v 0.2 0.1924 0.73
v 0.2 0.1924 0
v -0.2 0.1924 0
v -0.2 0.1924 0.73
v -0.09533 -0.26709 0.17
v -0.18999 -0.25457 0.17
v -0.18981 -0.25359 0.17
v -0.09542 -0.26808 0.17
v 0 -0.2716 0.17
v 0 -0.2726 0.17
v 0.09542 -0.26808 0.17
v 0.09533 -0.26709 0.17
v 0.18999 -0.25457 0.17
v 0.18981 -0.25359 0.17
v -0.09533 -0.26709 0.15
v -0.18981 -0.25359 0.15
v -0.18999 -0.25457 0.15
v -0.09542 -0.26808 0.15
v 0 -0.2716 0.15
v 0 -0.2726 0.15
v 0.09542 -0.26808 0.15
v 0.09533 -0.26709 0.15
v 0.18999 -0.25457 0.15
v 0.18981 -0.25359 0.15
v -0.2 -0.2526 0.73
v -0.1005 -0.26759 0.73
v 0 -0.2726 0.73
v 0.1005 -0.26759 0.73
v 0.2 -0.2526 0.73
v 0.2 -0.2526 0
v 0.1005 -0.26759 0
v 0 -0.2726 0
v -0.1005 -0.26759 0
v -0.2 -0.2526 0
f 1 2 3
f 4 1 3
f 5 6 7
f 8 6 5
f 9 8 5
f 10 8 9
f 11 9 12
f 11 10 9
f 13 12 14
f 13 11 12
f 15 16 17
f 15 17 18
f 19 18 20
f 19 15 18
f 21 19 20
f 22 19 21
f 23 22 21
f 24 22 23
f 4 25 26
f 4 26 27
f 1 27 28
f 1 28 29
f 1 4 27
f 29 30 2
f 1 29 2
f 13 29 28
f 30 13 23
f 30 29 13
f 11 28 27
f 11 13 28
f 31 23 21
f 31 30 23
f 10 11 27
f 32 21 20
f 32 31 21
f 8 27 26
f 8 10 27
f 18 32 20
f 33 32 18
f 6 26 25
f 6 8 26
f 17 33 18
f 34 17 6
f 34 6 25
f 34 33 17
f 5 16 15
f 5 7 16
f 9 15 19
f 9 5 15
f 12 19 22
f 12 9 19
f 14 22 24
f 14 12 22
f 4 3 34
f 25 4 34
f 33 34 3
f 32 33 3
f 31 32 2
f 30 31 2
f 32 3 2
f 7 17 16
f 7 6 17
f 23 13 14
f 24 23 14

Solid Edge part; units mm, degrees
sketch "Sketch1" plane through (0, 0, 0) normal (0, 0, 1) x (1, 0, 0)
  line L0 (0.2, -0.2526) -> (0.2, 0.1924)
  line L1 (0.2, 0.1924) -> (-0.2, 0.1924)
  line L2 (-0.2, 0.1924) -> (-0.2, -0.2526)
  arc A0 (-0.2, -0.2526) -> (0.2, -0.2526) centre (0, 0.7374) ccw
  dimension "D1" = 0.2
  dimension "D2" = 0
extrude "Protrusion1" add sketch "Sketch1" along normal blind 0.73
sketch "Sketch2" plane through (0, -0.0401, 0) normal (0, 0, -1) x (1, 0, 0)
  arc A0 (-0.19, 0.2145) -> (0.19, 0.2145) centre (0, -0.7775) cw
sketch "Sketch3" plane through (0, 0, 0) normal (1, 0, 0) x (0, 1, 0)
  line L0 (-0.2792, 0.15) -> (-0.2716, 0.15)
  line L1 (-0.2716, 0.15) -> (-0.2716, 0.17)
  line L2 (-0.2716, 0.17) -> (-0.2792, 0.17)
  line L3 (-0.2792, 0.17) -> (-0.2792, 0.15)
  dimension "D1" = 0.02
sweep "SweptCutout1" cut profiles "Sketch3" path "Sketch2"
